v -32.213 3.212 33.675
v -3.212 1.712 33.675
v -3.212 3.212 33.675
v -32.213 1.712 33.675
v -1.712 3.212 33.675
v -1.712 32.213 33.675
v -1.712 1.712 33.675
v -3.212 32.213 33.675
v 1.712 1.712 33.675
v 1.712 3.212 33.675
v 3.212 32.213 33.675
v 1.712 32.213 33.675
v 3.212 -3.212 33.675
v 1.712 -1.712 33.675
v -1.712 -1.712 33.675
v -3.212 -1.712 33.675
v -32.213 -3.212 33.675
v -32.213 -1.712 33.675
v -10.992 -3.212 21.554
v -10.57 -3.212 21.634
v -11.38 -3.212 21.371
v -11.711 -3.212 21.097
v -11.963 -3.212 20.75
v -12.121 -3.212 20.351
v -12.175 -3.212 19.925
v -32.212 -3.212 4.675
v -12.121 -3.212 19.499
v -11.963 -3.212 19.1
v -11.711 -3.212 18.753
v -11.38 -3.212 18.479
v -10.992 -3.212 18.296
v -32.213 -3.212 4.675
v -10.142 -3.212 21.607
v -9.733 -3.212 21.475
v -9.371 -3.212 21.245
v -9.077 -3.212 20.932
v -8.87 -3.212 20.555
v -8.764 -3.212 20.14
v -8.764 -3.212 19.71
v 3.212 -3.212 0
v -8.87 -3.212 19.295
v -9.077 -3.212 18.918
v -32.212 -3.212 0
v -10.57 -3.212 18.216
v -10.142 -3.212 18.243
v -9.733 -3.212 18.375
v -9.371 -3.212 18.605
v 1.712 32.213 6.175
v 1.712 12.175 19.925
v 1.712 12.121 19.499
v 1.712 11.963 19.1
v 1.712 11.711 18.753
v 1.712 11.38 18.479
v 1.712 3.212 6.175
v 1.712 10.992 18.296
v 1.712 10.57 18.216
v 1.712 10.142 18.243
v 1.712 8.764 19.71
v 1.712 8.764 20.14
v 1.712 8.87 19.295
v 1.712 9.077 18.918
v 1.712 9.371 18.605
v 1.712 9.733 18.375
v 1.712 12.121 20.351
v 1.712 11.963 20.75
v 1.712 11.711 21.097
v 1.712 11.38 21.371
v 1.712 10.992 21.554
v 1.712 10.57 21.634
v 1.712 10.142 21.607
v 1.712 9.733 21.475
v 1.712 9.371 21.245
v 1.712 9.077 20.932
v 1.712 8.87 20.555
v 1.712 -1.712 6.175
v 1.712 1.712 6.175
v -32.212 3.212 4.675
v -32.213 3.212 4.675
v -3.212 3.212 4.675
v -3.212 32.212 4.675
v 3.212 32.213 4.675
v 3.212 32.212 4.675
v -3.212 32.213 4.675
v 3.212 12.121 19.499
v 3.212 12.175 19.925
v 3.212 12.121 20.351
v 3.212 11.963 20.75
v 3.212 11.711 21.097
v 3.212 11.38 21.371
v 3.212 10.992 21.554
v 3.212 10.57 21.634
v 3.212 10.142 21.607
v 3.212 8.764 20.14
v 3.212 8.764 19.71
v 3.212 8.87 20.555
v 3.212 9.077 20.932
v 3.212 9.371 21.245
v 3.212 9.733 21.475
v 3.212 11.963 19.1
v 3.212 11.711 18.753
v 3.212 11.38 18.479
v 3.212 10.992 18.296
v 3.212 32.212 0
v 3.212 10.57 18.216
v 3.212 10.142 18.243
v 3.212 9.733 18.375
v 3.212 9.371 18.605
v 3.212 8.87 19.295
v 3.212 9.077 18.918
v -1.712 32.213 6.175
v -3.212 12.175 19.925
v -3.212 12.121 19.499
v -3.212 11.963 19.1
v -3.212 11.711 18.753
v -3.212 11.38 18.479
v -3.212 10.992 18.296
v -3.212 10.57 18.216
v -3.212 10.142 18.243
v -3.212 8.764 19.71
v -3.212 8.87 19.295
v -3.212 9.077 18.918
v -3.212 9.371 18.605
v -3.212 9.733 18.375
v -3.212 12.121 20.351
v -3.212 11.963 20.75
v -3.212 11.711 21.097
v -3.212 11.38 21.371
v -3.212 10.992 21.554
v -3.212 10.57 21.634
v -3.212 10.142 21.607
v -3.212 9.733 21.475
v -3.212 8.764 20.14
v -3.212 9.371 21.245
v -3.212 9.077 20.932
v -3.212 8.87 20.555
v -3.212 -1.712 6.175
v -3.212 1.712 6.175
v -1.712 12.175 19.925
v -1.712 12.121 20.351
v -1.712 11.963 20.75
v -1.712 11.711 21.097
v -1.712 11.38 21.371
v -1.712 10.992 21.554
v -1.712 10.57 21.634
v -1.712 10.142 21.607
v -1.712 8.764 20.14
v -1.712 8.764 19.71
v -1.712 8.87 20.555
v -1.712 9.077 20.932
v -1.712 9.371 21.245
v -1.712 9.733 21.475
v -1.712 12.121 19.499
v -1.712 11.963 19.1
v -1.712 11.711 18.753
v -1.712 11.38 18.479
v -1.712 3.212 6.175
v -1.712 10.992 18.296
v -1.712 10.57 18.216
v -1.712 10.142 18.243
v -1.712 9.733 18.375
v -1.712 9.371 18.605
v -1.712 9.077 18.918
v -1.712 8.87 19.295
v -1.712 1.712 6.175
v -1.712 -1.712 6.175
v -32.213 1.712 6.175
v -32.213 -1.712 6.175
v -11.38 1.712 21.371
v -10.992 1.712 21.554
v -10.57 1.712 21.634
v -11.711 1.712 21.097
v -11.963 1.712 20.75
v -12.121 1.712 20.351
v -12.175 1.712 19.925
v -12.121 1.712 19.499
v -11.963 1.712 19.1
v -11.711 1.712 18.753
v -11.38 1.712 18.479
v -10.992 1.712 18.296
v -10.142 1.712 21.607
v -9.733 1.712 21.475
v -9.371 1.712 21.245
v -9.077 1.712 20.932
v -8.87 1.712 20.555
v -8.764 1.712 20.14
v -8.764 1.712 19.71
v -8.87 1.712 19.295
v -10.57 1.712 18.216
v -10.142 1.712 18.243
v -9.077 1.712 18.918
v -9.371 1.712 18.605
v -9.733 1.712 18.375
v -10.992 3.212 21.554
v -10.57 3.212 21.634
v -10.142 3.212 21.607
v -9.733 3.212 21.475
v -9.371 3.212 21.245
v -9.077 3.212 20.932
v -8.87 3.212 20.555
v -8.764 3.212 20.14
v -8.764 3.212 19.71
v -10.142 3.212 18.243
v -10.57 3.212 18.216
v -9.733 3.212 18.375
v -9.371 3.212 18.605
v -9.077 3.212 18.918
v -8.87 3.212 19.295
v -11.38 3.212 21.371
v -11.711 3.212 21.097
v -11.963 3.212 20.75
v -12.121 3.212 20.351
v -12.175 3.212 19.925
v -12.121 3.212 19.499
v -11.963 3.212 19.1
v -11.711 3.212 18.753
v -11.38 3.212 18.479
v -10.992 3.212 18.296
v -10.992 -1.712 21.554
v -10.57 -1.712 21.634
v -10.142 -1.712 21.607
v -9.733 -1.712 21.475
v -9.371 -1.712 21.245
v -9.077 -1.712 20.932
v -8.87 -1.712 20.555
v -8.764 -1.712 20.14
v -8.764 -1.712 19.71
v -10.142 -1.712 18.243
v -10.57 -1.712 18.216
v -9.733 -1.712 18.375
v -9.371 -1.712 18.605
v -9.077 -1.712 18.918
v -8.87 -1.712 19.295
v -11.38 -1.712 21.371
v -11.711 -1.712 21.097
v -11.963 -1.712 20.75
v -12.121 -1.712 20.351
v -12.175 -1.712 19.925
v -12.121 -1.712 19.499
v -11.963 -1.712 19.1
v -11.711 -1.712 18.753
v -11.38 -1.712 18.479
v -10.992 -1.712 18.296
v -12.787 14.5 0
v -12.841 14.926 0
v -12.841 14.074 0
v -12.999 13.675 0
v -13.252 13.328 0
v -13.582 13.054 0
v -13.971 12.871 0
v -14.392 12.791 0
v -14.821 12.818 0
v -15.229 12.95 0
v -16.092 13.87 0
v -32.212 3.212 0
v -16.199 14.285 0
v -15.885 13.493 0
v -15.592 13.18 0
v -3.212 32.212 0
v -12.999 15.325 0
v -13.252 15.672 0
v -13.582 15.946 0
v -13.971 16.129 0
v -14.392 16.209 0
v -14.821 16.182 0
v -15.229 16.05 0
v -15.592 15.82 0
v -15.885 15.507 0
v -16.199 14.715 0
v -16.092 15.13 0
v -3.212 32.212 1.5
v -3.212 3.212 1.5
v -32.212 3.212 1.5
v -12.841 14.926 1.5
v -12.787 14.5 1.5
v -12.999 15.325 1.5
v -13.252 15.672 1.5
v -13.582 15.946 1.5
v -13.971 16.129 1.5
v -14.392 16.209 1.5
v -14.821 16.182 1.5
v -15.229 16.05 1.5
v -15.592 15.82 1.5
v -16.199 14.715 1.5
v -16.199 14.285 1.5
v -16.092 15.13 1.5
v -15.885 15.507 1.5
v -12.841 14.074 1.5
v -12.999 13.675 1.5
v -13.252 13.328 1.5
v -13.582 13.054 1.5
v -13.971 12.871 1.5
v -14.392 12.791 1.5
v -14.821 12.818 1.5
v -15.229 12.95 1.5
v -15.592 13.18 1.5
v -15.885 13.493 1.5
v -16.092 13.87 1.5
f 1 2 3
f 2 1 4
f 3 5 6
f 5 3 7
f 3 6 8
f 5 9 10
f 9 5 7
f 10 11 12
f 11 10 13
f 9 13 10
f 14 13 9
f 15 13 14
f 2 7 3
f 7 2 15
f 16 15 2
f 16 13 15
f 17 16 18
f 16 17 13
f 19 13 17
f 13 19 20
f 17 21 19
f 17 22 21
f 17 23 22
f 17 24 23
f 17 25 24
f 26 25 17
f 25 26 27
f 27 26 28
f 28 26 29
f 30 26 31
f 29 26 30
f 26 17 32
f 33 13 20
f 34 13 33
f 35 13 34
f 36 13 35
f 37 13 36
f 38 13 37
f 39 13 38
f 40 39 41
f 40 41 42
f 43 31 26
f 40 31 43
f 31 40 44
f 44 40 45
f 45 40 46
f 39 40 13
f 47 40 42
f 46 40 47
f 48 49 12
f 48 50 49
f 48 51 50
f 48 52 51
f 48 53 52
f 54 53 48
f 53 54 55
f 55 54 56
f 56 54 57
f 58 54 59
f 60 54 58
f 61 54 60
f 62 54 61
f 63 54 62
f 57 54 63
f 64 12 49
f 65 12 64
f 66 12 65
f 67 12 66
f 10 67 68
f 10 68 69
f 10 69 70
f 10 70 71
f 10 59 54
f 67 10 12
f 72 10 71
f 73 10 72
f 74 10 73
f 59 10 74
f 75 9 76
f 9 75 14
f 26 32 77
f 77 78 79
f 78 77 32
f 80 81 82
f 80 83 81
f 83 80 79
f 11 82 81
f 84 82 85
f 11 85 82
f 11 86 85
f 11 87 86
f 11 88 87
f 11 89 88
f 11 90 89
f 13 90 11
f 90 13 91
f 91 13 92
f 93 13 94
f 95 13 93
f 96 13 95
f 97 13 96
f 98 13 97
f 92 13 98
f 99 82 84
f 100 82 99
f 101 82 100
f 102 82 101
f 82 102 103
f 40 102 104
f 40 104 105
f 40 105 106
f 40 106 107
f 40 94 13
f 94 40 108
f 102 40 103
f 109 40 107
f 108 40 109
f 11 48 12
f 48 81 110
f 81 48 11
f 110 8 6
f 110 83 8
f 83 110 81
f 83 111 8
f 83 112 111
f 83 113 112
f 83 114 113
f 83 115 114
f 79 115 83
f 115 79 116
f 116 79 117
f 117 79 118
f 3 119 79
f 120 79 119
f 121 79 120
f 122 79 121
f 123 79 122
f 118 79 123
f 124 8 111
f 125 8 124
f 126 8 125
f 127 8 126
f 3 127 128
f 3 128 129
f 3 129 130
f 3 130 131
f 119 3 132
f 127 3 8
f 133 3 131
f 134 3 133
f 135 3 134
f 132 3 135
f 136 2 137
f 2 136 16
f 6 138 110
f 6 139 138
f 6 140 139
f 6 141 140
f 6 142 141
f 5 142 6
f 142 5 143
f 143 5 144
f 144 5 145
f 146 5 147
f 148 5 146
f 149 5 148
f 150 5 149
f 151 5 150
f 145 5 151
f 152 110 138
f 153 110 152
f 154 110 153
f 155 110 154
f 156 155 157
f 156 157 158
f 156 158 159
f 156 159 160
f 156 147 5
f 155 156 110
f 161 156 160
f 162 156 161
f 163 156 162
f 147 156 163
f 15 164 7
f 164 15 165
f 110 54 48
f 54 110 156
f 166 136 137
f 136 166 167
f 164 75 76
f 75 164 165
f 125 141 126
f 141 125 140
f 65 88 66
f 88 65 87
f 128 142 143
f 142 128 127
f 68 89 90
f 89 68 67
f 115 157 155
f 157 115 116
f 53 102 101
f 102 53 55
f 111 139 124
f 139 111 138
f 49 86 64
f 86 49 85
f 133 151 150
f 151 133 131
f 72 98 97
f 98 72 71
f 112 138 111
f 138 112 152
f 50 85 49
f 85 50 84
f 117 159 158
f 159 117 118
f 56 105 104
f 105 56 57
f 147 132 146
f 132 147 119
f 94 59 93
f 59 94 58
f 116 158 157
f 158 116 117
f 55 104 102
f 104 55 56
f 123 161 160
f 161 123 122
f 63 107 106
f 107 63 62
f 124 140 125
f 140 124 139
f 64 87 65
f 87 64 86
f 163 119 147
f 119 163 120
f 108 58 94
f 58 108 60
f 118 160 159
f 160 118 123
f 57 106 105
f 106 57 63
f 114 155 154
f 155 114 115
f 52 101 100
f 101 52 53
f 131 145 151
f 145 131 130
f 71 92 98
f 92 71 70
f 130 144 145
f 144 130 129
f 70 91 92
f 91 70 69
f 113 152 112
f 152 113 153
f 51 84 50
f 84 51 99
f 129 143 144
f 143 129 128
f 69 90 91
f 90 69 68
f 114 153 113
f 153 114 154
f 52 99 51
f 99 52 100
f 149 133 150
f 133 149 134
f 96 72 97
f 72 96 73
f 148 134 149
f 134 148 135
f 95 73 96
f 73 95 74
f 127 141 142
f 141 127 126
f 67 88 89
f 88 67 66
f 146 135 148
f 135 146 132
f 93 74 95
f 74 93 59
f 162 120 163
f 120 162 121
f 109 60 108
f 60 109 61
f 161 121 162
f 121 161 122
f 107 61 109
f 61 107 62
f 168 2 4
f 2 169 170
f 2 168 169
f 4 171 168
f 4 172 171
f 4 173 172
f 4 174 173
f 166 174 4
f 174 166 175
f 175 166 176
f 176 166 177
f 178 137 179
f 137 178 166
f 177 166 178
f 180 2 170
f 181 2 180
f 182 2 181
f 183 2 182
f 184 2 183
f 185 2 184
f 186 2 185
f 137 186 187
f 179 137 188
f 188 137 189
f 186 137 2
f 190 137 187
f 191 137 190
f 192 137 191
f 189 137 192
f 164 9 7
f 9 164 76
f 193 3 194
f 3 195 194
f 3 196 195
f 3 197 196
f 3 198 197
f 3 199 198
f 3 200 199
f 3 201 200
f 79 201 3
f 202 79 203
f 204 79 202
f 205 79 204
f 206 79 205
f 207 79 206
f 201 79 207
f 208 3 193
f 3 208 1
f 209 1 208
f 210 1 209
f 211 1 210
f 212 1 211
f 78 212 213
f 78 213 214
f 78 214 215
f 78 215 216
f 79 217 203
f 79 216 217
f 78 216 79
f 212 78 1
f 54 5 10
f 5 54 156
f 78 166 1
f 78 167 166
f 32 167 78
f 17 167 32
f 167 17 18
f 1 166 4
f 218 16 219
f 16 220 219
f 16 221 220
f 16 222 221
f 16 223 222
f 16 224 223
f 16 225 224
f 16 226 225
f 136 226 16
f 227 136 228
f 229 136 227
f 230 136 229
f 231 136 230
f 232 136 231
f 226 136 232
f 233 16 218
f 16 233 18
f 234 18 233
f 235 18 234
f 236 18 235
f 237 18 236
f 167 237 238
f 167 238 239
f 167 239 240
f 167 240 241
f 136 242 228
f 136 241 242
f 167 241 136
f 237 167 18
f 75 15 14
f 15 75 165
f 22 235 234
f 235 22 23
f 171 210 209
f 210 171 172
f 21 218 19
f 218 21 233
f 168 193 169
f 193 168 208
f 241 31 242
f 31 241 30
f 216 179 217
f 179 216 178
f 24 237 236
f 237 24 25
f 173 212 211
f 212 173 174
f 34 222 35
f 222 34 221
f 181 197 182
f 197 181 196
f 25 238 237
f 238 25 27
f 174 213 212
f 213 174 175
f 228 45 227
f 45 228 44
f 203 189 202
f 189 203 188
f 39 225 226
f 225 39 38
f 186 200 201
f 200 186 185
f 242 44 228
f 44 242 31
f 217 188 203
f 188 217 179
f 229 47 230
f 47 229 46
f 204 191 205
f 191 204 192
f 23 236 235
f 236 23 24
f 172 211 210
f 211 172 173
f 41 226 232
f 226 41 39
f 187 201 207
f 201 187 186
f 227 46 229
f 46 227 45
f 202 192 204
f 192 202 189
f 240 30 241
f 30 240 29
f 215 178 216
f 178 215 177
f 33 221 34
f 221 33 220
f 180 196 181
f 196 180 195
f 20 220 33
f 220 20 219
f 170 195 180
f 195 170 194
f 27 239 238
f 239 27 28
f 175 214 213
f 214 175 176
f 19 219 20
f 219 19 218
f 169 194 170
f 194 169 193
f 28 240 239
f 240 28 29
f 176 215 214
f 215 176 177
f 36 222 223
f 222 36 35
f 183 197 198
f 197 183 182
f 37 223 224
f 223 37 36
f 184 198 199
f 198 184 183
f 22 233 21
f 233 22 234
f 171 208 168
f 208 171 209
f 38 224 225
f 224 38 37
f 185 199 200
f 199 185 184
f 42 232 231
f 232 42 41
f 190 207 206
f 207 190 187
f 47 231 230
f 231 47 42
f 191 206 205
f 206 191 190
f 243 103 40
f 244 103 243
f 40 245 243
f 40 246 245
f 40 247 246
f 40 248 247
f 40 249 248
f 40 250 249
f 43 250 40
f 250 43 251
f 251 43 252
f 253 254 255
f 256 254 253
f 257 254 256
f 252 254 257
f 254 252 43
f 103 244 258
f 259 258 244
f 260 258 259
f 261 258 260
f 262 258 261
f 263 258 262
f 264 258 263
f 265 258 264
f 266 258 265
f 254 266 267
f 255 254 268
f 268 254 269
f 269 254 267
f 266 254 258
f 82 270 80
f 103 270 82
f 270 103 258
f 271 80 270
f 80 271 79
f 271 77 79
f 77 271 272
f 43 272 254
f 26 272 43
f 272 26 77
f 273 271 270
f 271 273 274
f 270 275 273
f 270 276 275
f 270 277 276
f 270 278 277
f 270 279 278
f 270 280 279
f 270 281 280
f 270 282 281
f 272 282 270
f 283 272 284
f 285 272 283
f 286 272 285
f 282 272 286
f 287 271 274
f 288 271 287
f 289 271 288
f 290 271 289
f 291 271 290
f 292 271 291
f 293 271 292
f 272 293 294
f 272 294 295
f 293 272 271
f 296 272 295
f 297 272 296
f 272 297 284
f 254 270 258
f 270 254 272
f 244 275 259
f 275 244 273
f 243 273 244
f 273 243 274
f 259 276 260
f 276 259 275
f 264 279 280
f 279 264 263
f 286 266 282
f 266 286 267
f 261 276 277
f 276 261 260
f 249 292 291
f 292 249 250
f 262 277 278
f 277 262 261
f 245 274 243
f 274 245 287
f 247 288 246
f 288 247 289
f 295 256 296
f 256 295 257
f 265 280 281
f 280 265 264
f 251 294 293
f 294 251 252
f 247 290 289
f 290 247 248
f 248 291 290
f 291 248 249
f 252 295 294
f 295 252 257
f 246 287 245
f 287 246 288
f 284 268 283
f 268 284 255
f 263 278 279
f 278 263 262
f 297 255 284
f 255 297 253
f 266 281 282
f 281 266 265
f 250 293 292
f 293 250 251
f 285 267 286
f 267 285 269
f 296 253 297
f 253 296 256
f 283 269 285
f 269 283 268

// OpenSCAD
// file: corner.scad
module corner() {
    cornerArm();  
    rotate([0, 0, 90]) cornerArm(); 
}


module cornerArm(armLength = shortCornerArm) {
    
    otherShift = (armLength  - materialWidth - shellWidth * 2 - margin) / 2;
    armPinOffset = slotDepth / 2 + (shellWidth * 2 + materialWidth + margin) / 2;

    difference() {
        
        union() {
            translate([wallShift,otherShift,0])
                rotate([0,0,90])
                    wall(armLength);

            translate([-wallShift,otherShift,0])
                rotate([0,0,90])
                    wall(armLength);

            translate([0, otherShift, 0]) 
                rotate([0,0,90])
                    bottom(lenght=armLength);
        }

        translate([0, armPinOffset, 0]) 
            rotate([0,0,90])
                pinHole();


    }

}


module outsideCorner() {

    // offset used for this pin
    offset = (longCornerArm - totalWidth)/ 2 ;

    difference(){
        union() {
            translate([0,0,shellWidth + materialWidth]) {   
                cornerArm(longCornerArm);  
                rotate([0, 0, 90])  cornerArm(longCornerArm);
            }

            linear_extrude(shellWidth  * 2 + materialWidth) 
            translate([totalWidth/2, totalWidth/-2, 0]) 
                polygon([
                    [0,0],
                    [0,longCornerArm],
                    [-totalWidth,longCornerArm],
                    [-totalWidth, totalWidth],
                    [-longCornerArm, totalWidth],
                    [-longCornerArm, 0]
            ]);
            cornerBottom();
        }
        
        translate([-offset,offset,0]) 
            cylinder(d=pinHoleDia, h=pinLenth, center=true);

    }

}


module cornerBottom() {
    linear_extrude(shellWidth) 
    translate([totalWidth/2, totalWidth/-2, 0]) 
        polygon([
            [0,0],
            [0,longCornerArm],
            [-totalWidth,longCornerArm],
            [-longCornerArm, totalWidth],
            [-longCornerArm, 0],
    ]);
}
// file: tee.scad
module tee() {
    
    unitLength = slotDepth * 2 + shellWidth * 2 + materialWidth + margin;
    pinOffset = (unitLength - slotDepth) / 2; 

    difference() {

        union() {
            translate([0,wallShift,0]) wall(unitLength);
            translate([0,-wallShift,0]) wall(unitLength);
            bottom(lenght=unitLength);
        }
        translate([pinOffset, 0, 0]) pinHole();
        translate([-pinOffset, 0, 0]) pinHole();

    }

    armLength = slotDepth + shellWidth * 2 + materialWidth + margin;
    otherShift = (armLength  - materialWidth - shellWidth * 2) / 2;
    armPinOffset = slotDepth / 2 + (shellWidth * 2 + materialWidth + margin) / 2;

    difference() {
        
        union() {
            translate([wallShift,otherShift,0])
                rotate([0,0,90])
                    wall(armLength);

            translate([-wallShift,otherShift,0])
                rotate([0,0,90])
                    wall(armLength);

            translate([0, otherShift, 0]) 
                rotate([0,0,90])
                    bottom(lenght=armLength);
        }

        translate([0, armPinOffset, 0]) 
            rotate([0,0,90])
                pinHole();


    }

  

}
// file: couple.scad
module couple() {

    unitLenght = slotDepth * 2 + materialWidth;
    pinOffset = (unitLenght - slotDepth) / 2; 

    difference() {
        
        union() {
            
            translate([0,wallShift,0]) wall(unitLenght);
            translate([0,-wallShift,0]) wall(unitLenght);
            rotate([0,0,90]) wall(totalWidth);
            bottom(lenght=unitLenght);

        }
   

    translate([pinOffset, 0, 0]) pinHole();
    translate([-pinOffset, 0, 0]) pinHole();

    }    

}
// file: fourway.scad
module fourWay() {

    fourWayHalf();
    rotate([0, 0, 90]) fourWayHalf();

}

module fourWayHalf() {
   unitLenght = slotDepth * 2 + shellWidth * 2 + materialWidth + margin;
    pinOffset = (unitLenght - slotDepth) / 2; 

    difference() {
        
        union() {
            translate([0,wallShift,0]) wall(unitLenght);
            translate([0,-wallShift,0]) wall(unitLenght);
            bottom(lenght=unitLenght);
        }

        translate([pinOffset, 0, 0]) pinHole();
        translate([-pinOffset, 0, 0]) pinHole();

    }
}
// main file
include <fourway.scad>;
include <couple.scad>;
include <tee.scad>;
include <corner.scad>;

$fn = 25;

// millimeters per inch
ratio = 25.4;

materialWidth = 1/8 * ratio;
materialHeight = 27.5;
shellWidth = 1.5;

margin = 0.25;
totalWidth = 2*shellWidth + materialWidth + margin;

wallHeight = materialHeight + shellWidth;
slotDepth = wallHeight / 2;

wallShift = (materialWidth + shellWidth + margin)/2;

pinHoleDia = materialWidth + margin;
pinLenth = totalWidth + 1;
pinHeight = shellWidth + (materialHeight/2);


shortCornerArm = slotDepth + shellWidth * 2 + materialWidth + margin;
longCornerArm = wallHeight + shellWidth * 2 + materialWidth + margin;

// mock wall
translate([0, 0, shellWidth + materialHeight/2])
%cube([50,materialWidth,materialHeight], true);

module wall(len = 25) {
    translate([0,0,wallHeight/2])
    cube([len, shellWidth, wallHeight], true);
}

module pinHole() {
    translate([0, 0, pinHeight]) 
    rotate([90, 0, 0]) 
    cylinder(d=pinHoleDia, h=pinLenth, center=true);
}

// buttCouple();


module bottom(width = totalWidth, lenght = 10) {
    translate([0,0,shellWidth/2])
    cube([lenght,width,shellWidth], true);
}


// couple();
// fourWay();
// tee();
//corner();

outsideCorner();
